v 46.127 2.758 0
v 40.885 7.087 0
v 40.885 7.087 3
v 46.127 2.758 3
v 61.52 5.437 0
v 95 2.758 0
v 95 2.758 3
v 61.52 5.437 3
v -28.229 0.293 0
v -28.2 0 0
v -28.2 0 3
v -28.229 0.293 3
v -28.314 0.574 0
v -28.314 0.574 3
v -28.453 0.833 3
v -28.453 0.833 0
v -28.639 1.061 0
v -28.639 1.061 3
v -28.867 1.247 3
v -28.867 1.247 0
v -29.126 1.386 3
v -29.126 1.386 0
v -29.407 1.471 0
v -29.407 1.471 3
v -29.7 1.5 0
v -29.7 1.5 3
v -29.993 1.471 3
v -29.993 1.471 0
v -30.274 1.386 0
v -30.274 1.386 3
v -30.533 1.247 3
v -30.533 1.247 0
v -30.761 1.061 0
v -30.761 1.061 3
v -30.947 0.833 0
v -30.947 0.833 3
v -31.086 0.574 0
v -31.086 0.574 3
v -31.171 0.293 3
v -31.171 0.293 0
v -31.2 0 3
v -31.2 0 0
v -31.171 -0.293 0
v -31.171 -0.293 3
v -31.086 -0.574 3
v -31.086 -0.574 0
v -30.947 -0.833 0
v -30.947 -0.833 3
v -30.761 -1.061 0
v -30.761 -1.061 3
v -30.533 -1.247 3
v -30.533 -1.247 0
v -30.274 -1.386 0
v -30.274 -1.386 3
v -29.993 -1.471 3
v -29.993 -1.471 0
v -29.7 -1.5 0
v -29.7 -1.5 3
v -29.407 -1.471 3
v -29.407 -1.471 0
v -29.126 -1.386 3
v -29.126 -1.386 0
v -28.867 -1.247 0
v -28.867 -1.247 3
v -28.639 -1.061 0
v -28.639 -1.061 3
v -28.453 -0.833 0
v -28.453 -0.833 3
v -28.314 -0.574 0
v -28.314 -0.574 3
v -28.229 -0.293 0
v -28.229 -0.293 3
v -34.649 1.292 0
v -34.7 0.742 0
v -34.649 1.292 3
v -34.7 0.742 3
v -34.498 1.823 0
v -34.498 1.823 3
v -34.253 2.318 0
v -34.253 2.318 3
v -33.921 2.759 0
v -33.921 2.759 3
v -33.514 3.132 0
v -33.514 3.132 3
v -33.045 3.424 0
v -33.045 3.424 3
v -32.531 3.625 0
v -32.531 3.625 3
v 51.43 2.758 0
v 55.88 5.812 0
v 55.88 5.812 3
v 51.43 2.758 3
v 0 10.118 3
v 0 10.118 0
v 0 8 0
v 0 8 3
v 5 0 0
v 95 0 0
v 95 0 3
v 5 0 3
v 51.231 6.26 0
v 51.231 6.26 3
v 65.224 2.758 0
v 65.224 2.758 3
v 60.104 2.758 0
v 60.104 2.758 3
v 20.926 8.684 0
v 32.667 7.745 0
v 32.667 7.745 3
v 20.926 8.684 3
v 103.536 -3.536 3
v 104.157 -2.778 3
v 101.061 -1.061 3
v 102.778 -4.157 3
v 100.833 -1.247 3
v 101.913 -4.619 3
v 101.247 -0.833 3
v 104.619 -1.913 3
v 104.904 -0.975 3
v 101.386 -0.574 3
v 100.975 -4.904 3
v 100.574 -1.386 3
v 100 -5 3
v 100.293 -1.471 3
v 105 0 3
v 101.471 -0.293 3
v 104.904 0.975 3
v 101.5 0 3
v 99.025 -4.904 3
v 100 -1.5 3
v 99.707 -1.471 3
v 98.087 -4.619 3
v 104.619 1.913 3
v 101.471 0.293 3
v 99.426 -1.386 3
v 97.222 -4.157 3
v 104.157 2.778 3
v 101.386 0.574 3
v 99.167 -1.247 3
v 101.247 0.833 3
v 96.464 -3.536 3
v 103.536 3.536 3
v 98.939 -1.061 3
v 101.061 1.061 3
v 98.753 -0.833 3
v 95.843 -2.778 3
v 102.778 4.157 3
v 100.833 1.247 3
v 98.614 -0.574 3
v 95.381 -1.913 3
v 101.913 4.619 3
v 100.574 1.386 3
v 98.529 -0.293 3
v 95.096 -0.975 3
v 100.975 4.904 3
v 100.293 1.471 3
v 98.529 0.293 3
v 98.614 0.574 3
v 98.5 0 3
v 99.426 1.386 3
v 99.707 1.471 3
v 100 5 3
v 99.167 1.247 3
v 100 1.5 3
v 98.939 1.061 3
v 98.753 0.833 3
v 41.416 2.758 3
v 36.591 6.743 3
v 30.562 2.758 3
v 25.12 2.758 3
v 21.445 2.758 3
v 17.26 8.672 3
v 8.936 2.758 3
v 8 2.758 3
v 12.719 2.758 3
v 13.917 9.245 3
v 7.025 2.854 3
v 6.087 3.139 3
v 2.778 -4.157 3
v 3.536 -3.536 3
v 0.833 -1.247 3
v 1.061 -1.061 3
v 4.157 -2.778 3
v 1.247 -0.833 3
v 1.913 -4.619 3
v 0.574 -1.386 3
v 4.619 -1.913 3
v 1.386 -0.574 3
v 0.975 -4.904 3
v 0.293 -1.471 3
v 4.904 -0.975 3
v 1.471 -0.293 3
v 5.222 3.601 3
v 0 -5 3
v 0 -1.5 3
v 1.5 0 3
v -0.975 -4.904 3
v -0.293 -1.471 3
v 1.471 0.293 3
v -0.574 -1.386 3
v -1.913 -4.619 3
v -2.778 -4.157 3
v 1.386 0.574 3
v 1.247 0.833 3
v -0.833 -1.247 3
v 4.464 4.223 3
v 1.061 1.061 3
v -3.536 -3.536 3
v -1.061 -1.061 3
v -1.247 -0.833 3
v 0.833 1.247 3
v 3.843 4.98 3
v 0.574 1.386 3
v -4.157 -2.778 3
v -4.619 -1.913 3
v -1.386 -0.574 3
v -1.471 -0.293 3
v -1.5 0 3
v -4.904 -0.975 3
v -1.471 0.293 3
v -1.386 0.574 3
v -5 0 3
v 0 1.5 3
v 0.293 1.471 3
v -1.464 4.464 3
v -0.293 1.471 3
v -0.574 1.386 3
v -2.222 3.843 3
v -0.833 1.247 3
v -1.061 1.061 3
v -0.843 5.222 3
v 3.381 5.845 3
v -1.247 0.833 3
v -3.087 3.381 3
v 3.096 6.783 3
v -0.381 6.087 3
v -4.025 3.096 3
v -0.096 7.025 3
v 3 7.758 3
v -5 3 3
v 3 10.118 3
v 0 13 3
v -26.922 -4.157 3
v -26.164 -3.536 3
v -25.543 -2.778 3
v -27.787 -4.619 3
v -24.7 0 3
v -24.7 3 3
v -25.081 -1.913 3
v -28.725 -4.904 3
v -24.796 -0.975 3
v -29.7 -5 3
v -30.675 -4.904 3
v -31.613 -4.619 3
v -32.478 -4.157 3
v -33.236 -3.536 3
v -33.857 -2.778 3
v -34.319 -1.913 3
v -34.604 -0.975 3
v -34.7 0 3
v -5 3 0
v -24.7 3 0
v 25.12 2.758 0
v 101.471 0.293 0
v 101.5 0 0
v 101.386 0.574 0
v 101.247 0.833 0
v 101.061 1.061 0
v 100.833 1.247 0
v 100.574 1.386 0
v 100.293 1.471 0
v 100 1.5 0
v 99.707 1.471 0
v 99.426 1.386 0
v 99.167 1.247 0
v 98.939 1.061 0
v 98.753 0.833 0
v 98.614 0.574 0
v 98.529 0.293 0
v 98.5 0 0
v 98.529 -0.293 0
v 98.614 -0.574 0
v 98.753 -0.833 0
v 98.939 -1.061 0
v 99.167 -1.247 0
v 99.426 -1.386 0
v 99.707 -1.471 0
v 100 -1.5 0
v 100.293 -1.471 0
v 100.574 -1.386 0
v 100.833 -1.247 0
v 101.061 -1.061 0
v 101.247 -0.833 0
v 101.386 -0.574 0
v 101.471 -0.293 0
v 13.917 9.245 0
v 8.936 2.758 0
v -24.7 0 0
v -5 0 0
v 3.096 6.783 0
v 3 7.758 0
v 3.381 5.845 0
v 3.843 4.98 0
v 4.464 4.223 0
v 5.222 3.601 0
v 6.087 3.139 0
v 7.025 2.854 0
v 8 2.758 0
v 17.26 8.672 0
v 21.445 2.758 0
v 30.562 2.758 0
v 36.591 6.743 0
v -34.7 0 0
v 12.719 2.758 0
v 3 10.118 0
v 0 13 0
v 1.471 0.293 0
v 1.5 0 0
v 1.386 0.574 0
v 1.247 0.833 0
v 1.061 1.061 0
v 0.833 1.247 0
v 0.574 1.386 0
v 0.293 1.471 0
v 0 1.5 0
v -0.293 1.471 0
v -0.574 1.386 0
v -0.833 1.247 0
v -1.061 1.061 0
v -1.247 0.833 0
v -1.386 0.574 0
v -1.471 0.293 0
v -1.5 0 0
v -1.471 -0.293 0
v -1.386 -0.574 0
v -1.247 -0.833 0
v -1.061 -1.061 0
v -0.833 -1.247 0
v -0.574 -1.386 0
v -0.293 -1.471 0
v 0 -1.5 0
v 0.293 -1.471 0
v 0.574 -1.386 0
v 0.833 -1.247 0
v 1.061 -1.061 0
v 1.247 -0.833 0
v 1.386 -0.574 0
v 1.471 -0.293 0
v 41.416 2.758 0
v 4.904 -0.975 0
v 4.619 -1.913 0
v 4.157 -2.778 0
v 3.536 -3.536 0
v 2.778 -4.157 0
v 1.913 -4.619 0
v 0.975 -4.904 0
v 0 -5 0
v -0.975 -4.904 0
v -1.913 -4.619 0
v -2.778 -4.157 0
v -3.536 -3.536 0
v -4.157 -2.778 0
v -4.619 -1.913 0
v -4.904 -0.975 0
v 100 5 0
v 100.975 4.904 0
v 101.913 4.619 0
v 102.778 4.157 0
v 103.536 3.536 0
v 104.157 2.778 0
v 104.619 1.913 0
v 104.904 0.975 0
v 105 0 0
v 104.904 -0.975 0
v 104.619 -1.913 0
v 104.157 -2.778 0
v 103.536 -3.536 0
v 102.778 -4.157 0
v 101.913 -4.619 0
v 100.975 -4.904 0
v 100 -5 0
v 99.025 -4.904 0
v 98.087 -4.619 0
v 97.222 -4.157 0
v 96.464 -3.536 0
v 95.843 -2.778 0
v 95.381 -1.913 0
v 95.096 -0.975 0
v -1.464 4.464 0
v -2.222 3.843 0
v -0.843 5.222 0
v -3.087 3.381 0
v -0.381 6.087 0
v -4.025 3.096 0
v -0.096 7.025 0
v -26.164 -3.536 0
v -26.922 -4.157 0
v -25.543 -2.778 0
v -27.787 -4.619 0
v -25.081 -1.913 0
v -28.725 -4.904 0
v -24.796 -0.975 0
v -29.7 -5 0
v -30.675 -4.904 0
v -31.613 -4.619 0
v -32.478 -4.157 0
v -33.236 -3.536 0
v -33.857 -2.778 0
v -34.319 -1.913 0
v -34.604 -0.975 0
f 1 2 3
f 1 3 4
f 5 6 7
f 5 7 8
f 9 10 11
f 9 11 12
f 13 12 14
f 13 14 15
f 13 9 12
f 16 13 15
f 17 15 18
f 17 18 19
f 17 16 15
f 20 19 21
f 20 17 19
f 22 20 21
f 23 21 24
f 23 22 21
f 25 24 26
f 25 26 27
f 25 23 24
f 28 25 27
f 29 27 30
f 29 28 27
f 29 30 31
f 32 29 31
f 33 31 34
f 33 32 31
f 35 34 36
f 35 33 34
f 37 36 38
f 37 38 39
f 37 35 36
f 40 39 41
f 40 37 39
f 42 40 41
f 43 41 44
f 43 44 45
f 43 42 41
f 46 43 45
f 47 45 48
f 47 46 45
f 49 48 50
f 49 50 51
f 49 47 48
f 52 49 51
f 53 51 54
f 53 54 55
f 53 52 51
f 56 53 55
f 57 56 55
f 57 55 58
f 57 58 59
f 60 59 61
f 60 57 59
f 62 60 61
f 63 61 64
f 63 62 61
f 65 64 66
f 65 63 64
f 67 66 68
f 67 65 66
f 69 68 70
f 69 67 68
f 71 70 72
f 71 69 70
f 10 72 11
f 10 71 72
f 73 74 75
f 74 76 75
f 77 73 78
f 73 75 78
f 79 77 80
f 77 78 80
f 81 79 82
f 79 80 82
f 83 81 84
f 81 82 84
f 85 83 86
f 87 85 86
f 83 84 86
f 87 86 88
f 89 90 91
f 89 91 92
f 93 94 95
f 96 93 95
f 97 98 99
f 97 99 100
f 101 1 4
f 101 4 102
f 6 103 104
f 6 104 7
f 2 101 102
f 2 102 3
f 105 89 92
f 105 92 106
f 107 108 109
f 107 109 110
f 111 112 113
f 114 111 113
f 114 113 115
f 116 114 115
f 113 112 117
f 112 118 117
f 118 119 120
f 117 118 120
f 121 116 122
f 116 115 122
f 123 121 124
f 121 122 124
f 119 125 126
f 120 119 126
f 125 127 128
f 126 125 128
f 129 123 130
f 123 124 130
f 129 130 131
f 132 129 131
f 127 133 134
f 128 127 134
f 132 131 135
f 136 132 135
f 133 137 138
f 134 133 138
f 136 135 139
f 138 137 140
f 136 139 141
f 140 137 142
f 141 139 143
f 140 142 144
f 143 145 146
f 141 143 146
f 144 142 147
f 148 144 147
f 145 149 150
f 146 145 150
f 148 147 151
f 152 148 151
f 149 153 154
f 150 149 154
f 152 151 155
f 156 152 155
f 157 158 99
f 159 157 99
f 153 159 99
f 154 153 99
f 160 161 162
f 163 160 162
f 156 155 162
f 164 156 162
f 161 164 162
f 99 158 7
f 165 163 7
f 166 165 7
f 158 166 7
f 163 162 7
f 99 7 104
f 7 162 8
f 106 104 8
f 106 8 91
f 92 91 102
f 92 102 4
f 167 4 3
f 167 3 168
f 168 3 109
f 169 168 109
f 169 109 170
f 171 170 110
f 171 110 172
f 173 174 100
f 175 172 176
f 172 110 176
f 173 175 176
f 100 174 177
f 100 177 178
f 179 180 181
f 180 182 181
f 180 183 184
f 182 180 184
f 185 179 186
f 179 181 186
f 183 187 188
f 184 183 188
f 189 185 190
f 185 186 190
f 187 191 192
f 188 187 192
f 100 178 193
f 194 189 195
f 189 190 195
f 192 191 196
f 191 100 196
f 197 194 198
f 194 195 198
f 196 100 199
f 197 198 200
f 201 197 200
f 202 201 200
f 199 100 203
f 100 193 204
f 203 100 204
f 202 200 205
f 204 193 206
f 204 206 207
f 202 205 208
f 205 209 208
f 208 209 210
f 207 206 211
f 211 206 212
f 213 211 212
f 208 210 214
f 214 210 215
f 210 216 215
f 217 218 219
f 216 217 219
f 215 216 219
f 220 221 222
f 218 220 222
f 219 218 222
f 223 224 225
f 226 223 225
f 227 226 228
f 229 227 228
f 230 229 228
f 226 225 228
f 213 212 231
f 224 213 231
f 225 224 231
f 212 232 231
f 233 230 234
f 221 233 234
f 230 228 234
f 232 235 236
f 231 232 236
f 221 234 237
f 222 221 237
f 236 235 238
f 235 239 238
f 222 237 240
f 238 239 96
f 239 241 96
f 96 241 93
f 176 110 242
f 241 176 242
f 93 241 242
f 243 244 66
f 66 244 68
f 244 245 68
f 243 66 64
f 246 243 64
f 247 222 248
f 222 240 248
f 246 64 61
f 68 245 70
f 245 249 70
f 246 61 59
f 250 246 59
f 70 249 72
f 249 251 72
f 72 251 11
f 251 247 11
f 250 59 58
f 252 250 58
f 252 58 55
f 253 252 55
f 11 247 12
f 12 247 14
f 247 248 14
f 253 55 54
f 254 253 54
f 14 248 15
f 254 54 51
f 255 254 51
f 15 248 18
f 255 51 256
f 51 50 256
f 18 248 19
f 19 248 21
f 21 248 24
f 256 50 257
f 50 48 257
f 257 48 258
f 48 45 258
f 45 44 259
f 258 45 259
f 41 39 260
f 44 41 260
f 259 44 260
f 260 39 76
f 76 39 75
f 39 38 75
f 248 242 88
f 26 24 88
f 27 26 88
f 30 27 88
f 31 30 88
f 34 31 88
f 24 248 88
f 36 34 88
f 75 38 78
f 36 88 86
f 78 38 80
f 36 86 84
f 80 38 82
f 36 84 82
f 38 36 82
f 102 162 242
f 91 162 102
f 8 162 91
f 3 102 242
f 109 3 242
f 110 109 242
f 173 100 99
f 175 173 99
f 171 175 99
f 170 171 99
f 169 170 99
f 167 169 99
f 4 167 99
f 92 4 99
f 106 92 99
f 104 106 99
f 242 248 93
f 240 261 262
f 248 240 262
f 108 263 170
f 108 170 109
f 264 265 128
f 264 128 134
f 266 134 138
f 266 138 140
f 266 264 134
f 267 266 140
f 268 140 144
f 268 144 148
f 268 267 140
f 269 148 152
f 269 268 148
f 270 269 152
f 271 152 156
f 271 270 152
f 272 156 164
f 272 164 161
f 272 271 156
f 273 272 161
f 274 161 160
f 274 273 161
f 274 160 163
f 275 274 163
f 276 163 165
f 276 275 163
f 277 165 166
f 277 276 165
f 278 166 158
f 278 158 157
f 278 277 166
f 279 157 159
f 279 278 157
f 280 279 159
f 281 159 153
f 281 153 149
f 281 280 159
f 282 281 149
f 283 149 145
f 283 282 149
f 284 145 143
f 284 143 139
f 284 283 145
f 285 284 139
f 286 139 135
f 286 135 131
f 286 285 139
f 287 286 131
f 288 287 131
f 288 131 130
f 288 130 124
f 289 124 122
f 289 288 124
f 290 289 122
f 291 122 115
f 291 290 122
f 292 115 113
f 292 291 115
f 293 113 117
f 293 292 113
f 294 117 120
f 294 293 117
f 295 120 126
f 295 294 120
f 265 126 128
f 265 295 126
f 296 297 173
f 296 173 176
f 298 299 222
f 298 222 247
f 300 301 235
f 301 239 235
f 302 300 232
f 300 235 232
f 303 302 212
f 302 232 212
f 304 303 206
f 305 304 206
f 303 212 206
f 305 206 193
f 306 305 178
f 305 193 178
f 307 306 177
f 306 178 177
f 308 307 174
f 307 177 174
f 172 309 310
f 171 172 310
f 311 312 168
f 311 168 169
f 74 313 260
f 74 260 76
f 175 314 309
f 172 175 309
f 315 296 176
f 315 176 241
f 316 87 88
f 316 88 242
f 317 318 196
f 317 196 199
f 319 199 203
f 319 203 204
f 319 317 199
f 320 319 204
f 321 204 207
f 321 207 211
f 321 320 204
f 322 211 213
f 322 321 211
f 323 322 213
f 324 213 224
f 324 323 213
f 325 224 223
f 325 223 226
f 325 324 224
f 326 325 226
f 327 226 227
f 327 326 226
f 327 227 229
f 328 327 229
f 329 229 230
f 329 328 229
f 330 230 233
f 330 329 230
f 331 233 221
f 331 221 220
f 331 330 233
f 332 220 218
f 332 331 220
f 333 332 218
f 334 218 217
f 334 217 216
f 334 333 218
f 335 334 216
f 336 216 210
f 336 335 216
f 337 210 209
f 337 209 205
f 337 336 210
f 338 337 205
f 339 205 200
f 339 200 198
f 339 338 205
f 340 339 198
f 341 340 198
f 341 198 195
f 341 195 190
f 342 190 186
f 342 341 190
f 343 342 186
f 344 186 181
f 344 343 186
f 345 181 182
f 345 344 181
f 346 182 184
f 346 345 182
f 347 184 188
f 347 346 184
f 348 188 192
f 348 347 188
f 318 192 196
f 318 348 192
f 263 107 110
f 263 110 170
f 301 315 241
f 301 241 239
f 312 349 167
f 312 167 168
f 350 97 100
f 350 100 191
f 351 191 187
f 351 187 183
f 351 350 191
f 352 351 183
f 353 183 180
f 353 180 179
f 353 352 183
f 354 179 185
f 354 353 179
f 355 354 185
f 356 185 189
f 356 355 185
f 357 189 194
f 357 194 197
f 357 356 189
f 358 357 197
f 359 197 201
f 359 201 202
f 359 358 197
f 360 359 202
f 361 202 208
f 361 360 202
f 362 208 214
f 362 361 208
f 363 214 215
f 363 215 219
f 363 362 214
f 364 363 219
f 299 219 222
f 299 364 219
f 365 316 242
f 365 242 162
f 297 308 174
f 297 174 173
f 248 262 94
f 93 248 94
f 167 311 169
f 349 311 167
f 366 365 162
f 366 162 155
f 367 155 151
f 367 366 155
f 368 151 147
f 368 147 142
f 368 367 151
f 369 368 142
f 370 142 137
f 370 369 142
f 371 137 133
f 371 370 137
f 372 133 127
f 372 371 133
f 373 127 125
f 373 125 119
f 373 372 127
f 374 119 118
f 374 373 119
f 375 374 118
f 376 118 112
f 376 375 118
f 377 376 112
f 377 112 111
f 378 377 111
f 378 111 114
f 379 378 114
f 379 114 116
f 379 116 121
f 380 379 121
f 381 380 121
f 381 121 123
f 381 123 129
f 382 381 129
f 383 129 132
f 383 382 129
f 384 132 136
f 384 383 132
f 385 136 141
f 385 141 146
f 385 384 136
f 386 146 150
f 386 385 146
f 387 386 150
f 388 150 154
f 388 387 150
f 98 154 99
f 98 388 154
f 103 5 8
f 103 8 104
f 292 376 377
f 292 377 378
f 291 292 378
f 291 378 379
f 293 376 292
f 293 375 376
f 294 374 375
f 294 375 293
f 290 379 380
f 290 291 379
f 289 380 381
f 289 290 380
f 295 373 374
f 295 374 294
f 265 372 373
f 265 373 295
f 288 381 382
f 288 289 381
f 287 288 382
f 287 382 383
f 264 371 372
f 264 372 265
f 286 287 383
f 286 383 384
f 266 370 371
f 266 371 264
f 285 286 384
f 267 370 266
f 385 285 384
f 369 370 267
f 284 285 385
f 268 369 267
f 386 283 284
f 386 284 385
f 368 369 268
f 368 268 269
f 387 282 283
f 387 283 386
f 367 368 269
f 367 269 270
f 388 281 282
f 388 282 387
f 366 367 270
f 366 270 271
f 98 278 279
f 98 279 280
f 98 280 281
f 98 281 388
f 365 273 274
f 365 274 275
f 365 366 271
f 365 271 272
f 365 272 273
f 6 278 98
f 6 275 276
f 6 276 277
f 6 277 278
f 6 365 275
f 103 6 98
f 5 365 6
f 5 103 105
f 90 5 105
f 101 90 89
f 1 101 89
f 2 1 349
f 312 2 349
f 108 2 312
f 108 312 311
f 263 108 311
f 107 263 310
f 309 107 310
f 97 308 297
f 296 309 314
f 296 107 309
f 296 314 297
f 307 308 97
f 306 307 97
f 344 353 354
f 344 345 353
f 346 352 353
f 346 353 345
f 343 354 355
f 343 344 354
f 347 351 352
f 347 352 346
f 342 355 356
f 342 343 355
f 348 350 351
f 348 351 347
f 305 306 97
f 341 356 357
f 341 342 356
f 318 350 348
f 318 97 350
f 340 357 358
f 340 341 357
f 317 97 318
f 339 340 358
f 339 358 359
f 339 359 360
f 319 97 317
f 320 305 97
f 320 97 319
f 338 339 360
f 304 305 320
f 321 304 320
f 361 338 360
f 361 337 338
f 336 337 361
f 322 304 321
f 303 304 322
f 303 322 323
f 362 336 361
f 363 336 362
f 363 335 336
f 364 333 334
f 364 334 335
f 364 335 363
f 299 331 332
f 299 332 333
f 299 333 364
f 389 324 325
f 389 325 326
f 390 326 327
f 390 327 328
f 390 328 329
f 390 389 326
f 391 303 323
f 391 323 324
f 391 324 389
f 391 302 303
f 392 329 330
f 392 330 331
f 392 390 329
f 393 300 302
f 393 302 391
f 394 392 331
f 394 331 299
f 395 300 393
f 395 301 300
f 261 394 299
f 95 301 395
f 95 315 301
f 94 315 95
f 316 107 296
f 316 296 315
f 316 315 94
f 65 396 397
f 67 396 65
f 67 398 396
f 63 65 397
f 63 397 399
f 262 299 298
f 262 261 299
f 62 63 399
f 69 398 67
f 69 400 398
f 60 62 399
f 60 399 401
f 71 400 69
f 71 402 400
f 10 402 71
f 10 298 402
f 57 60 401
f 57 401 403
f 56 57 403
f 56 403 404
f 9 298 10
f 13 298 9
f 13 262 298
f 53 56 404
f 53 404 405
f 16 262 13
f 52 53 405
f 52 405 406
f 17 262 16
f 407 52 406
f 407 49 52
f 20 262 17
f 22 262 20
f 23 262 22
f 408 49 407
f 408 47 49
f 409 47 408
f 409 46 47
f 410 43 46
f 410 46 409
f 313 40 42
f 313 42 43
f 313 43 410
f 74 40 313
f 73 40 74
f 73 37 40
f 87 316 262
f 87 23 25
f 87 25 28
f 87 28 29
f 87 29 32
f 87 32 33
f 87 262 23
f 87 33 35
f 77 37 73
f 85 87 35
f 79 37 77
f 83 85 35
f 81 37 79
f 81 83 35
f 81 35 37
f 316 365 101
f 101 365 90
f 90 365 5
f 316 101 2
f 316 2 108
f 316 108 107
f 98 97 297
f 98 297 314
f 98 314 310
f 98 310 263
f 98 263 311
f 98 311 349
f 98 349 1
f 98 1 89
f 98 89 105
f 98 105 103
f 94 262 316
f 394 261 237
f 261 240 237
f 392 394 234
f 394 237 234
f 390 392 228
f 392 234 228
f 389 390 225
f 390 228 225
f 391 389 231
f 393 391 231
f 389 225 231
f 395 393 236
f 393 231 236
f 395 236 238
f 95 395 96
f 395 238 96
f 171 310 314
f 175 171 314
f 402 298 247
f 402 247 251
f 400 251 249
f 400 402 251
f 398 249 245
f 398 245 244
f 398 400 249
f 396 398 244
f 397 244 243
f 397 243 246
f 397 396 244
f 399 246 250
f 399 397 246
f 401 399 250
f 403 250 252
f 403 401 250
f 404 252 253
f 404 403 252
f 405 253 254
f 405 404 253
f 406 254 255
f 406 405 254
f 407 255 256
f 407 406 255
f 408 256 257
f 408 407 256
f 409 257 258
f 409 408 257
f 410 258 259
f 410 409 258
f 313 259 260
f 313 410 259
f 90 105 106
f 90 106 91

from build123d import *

# Parameters (mm, degrees)
SKETCH1_R           = 1.5
BOSS_EXTRUDE1_DEPTH = 3
FILLET1_R           = 3
FILLET2_R           = 5
FILLET3_R           = 5


with BuildPart() as part:
    # Sketch1 → Boss-Extrude1 (new body)
    with BuildSketch(Plane.XY):
        with BuildLine():
            Line((-34.7, 0), (-34.7, 3))
            Line((-34.7, 3), (0, 13))
            Line((0, 13), (100, 5))
            ThreePointArc((100, 5), (103.535533906, -3.535533906), (95, 0))
            Line((95, 0), (5, 0))
            ThreePointArc((5, 0), (0, -5), (-5, 0))
            Line((-5, 0), (-24.7, 0))
            ThreePointArc((-24.7, 0), (-29.7, -5), (-34.7, 0))
        make_face()
        with Locations((-29.7, 0)):
            Circle(SKETCH1_R, mode=Mode.SUBTRACT)
        Circle(SKETCH1_R, mode=Mode.SUBTRACT)
        with Locations((100, 0)):
            Circle(SKETCH1_R, mode=Mode.SUBTRACT)
        Polygon((-24.7, 3), (0, 10.11815562), (0, 3), align=None, mode=Mode.SUBTRACT)
        Polygon((3, 10.11815562), (3, 2.75815562), (8.936211527, 2.75815562), (13.917047711, 9.244791803), align=None, mode=Mode.SUBTRACT)
        Polygon((95, 2.75815562), (61.51973762, 5.43657661), (65.22442054, 2.75815562), align=None, mode=Mode.SUBTRACT)
        Polygon((12.718604589, 2.75815562), (17.259569147, 8.671938752), (21.444976035, 2.75815562), align=None, mode=Mode.SUBTRACT)
        Polygon((20.926325466, 8.684049582), (25.120303644, 2.75815562), (32.666592003, 7.744828259), align=None, mode=Mode.SUBTRACT)
        Polygon((30.561852618, 2.75815562), (41.416029489, 2.75815562), (36.591409828, 6.742555173), align=None, mode=Mode.SUBTRACT)
        Polygon((40.885181342, 7.087341112), (46.12729453, 2.75815562), (51.230503333, 6.259715353), align=None, mode=Mode.SUBTRACT)
        Polygon((51.429784502, 2.75815562), (60.104052681, 2.75815562), (55.880288815, 5.81186306), align=None, mode=Mode.SUBTRACT)
    extrude(amount=BOSS_EXTRUDE1_DEPTH)

    # Fillet1
    fillet1_edges = [part.edges().sort_by_distance(p)[0] for p in [
        (-34.7, 3, 1.5),
    ]]
    fillet(fillet1_edges, radius=FILLET1_R)

    # Fillet2
    fillet2_edges = [part.edges().sort_by_distance(p)[0] for p in [
        (0, 3, 1.5),
    ]]
    fillet(fillet2_edges, radius=FILLET2_R)

    # Fillet3
    fillet3_edges = [part.edges().sort_by_distance(p)[0] for p in [
        (3, 2.75815562, 1.5),
    ]]
    fillet(fillet3_edges, radius=FILLET3_R)


solid = part.part
